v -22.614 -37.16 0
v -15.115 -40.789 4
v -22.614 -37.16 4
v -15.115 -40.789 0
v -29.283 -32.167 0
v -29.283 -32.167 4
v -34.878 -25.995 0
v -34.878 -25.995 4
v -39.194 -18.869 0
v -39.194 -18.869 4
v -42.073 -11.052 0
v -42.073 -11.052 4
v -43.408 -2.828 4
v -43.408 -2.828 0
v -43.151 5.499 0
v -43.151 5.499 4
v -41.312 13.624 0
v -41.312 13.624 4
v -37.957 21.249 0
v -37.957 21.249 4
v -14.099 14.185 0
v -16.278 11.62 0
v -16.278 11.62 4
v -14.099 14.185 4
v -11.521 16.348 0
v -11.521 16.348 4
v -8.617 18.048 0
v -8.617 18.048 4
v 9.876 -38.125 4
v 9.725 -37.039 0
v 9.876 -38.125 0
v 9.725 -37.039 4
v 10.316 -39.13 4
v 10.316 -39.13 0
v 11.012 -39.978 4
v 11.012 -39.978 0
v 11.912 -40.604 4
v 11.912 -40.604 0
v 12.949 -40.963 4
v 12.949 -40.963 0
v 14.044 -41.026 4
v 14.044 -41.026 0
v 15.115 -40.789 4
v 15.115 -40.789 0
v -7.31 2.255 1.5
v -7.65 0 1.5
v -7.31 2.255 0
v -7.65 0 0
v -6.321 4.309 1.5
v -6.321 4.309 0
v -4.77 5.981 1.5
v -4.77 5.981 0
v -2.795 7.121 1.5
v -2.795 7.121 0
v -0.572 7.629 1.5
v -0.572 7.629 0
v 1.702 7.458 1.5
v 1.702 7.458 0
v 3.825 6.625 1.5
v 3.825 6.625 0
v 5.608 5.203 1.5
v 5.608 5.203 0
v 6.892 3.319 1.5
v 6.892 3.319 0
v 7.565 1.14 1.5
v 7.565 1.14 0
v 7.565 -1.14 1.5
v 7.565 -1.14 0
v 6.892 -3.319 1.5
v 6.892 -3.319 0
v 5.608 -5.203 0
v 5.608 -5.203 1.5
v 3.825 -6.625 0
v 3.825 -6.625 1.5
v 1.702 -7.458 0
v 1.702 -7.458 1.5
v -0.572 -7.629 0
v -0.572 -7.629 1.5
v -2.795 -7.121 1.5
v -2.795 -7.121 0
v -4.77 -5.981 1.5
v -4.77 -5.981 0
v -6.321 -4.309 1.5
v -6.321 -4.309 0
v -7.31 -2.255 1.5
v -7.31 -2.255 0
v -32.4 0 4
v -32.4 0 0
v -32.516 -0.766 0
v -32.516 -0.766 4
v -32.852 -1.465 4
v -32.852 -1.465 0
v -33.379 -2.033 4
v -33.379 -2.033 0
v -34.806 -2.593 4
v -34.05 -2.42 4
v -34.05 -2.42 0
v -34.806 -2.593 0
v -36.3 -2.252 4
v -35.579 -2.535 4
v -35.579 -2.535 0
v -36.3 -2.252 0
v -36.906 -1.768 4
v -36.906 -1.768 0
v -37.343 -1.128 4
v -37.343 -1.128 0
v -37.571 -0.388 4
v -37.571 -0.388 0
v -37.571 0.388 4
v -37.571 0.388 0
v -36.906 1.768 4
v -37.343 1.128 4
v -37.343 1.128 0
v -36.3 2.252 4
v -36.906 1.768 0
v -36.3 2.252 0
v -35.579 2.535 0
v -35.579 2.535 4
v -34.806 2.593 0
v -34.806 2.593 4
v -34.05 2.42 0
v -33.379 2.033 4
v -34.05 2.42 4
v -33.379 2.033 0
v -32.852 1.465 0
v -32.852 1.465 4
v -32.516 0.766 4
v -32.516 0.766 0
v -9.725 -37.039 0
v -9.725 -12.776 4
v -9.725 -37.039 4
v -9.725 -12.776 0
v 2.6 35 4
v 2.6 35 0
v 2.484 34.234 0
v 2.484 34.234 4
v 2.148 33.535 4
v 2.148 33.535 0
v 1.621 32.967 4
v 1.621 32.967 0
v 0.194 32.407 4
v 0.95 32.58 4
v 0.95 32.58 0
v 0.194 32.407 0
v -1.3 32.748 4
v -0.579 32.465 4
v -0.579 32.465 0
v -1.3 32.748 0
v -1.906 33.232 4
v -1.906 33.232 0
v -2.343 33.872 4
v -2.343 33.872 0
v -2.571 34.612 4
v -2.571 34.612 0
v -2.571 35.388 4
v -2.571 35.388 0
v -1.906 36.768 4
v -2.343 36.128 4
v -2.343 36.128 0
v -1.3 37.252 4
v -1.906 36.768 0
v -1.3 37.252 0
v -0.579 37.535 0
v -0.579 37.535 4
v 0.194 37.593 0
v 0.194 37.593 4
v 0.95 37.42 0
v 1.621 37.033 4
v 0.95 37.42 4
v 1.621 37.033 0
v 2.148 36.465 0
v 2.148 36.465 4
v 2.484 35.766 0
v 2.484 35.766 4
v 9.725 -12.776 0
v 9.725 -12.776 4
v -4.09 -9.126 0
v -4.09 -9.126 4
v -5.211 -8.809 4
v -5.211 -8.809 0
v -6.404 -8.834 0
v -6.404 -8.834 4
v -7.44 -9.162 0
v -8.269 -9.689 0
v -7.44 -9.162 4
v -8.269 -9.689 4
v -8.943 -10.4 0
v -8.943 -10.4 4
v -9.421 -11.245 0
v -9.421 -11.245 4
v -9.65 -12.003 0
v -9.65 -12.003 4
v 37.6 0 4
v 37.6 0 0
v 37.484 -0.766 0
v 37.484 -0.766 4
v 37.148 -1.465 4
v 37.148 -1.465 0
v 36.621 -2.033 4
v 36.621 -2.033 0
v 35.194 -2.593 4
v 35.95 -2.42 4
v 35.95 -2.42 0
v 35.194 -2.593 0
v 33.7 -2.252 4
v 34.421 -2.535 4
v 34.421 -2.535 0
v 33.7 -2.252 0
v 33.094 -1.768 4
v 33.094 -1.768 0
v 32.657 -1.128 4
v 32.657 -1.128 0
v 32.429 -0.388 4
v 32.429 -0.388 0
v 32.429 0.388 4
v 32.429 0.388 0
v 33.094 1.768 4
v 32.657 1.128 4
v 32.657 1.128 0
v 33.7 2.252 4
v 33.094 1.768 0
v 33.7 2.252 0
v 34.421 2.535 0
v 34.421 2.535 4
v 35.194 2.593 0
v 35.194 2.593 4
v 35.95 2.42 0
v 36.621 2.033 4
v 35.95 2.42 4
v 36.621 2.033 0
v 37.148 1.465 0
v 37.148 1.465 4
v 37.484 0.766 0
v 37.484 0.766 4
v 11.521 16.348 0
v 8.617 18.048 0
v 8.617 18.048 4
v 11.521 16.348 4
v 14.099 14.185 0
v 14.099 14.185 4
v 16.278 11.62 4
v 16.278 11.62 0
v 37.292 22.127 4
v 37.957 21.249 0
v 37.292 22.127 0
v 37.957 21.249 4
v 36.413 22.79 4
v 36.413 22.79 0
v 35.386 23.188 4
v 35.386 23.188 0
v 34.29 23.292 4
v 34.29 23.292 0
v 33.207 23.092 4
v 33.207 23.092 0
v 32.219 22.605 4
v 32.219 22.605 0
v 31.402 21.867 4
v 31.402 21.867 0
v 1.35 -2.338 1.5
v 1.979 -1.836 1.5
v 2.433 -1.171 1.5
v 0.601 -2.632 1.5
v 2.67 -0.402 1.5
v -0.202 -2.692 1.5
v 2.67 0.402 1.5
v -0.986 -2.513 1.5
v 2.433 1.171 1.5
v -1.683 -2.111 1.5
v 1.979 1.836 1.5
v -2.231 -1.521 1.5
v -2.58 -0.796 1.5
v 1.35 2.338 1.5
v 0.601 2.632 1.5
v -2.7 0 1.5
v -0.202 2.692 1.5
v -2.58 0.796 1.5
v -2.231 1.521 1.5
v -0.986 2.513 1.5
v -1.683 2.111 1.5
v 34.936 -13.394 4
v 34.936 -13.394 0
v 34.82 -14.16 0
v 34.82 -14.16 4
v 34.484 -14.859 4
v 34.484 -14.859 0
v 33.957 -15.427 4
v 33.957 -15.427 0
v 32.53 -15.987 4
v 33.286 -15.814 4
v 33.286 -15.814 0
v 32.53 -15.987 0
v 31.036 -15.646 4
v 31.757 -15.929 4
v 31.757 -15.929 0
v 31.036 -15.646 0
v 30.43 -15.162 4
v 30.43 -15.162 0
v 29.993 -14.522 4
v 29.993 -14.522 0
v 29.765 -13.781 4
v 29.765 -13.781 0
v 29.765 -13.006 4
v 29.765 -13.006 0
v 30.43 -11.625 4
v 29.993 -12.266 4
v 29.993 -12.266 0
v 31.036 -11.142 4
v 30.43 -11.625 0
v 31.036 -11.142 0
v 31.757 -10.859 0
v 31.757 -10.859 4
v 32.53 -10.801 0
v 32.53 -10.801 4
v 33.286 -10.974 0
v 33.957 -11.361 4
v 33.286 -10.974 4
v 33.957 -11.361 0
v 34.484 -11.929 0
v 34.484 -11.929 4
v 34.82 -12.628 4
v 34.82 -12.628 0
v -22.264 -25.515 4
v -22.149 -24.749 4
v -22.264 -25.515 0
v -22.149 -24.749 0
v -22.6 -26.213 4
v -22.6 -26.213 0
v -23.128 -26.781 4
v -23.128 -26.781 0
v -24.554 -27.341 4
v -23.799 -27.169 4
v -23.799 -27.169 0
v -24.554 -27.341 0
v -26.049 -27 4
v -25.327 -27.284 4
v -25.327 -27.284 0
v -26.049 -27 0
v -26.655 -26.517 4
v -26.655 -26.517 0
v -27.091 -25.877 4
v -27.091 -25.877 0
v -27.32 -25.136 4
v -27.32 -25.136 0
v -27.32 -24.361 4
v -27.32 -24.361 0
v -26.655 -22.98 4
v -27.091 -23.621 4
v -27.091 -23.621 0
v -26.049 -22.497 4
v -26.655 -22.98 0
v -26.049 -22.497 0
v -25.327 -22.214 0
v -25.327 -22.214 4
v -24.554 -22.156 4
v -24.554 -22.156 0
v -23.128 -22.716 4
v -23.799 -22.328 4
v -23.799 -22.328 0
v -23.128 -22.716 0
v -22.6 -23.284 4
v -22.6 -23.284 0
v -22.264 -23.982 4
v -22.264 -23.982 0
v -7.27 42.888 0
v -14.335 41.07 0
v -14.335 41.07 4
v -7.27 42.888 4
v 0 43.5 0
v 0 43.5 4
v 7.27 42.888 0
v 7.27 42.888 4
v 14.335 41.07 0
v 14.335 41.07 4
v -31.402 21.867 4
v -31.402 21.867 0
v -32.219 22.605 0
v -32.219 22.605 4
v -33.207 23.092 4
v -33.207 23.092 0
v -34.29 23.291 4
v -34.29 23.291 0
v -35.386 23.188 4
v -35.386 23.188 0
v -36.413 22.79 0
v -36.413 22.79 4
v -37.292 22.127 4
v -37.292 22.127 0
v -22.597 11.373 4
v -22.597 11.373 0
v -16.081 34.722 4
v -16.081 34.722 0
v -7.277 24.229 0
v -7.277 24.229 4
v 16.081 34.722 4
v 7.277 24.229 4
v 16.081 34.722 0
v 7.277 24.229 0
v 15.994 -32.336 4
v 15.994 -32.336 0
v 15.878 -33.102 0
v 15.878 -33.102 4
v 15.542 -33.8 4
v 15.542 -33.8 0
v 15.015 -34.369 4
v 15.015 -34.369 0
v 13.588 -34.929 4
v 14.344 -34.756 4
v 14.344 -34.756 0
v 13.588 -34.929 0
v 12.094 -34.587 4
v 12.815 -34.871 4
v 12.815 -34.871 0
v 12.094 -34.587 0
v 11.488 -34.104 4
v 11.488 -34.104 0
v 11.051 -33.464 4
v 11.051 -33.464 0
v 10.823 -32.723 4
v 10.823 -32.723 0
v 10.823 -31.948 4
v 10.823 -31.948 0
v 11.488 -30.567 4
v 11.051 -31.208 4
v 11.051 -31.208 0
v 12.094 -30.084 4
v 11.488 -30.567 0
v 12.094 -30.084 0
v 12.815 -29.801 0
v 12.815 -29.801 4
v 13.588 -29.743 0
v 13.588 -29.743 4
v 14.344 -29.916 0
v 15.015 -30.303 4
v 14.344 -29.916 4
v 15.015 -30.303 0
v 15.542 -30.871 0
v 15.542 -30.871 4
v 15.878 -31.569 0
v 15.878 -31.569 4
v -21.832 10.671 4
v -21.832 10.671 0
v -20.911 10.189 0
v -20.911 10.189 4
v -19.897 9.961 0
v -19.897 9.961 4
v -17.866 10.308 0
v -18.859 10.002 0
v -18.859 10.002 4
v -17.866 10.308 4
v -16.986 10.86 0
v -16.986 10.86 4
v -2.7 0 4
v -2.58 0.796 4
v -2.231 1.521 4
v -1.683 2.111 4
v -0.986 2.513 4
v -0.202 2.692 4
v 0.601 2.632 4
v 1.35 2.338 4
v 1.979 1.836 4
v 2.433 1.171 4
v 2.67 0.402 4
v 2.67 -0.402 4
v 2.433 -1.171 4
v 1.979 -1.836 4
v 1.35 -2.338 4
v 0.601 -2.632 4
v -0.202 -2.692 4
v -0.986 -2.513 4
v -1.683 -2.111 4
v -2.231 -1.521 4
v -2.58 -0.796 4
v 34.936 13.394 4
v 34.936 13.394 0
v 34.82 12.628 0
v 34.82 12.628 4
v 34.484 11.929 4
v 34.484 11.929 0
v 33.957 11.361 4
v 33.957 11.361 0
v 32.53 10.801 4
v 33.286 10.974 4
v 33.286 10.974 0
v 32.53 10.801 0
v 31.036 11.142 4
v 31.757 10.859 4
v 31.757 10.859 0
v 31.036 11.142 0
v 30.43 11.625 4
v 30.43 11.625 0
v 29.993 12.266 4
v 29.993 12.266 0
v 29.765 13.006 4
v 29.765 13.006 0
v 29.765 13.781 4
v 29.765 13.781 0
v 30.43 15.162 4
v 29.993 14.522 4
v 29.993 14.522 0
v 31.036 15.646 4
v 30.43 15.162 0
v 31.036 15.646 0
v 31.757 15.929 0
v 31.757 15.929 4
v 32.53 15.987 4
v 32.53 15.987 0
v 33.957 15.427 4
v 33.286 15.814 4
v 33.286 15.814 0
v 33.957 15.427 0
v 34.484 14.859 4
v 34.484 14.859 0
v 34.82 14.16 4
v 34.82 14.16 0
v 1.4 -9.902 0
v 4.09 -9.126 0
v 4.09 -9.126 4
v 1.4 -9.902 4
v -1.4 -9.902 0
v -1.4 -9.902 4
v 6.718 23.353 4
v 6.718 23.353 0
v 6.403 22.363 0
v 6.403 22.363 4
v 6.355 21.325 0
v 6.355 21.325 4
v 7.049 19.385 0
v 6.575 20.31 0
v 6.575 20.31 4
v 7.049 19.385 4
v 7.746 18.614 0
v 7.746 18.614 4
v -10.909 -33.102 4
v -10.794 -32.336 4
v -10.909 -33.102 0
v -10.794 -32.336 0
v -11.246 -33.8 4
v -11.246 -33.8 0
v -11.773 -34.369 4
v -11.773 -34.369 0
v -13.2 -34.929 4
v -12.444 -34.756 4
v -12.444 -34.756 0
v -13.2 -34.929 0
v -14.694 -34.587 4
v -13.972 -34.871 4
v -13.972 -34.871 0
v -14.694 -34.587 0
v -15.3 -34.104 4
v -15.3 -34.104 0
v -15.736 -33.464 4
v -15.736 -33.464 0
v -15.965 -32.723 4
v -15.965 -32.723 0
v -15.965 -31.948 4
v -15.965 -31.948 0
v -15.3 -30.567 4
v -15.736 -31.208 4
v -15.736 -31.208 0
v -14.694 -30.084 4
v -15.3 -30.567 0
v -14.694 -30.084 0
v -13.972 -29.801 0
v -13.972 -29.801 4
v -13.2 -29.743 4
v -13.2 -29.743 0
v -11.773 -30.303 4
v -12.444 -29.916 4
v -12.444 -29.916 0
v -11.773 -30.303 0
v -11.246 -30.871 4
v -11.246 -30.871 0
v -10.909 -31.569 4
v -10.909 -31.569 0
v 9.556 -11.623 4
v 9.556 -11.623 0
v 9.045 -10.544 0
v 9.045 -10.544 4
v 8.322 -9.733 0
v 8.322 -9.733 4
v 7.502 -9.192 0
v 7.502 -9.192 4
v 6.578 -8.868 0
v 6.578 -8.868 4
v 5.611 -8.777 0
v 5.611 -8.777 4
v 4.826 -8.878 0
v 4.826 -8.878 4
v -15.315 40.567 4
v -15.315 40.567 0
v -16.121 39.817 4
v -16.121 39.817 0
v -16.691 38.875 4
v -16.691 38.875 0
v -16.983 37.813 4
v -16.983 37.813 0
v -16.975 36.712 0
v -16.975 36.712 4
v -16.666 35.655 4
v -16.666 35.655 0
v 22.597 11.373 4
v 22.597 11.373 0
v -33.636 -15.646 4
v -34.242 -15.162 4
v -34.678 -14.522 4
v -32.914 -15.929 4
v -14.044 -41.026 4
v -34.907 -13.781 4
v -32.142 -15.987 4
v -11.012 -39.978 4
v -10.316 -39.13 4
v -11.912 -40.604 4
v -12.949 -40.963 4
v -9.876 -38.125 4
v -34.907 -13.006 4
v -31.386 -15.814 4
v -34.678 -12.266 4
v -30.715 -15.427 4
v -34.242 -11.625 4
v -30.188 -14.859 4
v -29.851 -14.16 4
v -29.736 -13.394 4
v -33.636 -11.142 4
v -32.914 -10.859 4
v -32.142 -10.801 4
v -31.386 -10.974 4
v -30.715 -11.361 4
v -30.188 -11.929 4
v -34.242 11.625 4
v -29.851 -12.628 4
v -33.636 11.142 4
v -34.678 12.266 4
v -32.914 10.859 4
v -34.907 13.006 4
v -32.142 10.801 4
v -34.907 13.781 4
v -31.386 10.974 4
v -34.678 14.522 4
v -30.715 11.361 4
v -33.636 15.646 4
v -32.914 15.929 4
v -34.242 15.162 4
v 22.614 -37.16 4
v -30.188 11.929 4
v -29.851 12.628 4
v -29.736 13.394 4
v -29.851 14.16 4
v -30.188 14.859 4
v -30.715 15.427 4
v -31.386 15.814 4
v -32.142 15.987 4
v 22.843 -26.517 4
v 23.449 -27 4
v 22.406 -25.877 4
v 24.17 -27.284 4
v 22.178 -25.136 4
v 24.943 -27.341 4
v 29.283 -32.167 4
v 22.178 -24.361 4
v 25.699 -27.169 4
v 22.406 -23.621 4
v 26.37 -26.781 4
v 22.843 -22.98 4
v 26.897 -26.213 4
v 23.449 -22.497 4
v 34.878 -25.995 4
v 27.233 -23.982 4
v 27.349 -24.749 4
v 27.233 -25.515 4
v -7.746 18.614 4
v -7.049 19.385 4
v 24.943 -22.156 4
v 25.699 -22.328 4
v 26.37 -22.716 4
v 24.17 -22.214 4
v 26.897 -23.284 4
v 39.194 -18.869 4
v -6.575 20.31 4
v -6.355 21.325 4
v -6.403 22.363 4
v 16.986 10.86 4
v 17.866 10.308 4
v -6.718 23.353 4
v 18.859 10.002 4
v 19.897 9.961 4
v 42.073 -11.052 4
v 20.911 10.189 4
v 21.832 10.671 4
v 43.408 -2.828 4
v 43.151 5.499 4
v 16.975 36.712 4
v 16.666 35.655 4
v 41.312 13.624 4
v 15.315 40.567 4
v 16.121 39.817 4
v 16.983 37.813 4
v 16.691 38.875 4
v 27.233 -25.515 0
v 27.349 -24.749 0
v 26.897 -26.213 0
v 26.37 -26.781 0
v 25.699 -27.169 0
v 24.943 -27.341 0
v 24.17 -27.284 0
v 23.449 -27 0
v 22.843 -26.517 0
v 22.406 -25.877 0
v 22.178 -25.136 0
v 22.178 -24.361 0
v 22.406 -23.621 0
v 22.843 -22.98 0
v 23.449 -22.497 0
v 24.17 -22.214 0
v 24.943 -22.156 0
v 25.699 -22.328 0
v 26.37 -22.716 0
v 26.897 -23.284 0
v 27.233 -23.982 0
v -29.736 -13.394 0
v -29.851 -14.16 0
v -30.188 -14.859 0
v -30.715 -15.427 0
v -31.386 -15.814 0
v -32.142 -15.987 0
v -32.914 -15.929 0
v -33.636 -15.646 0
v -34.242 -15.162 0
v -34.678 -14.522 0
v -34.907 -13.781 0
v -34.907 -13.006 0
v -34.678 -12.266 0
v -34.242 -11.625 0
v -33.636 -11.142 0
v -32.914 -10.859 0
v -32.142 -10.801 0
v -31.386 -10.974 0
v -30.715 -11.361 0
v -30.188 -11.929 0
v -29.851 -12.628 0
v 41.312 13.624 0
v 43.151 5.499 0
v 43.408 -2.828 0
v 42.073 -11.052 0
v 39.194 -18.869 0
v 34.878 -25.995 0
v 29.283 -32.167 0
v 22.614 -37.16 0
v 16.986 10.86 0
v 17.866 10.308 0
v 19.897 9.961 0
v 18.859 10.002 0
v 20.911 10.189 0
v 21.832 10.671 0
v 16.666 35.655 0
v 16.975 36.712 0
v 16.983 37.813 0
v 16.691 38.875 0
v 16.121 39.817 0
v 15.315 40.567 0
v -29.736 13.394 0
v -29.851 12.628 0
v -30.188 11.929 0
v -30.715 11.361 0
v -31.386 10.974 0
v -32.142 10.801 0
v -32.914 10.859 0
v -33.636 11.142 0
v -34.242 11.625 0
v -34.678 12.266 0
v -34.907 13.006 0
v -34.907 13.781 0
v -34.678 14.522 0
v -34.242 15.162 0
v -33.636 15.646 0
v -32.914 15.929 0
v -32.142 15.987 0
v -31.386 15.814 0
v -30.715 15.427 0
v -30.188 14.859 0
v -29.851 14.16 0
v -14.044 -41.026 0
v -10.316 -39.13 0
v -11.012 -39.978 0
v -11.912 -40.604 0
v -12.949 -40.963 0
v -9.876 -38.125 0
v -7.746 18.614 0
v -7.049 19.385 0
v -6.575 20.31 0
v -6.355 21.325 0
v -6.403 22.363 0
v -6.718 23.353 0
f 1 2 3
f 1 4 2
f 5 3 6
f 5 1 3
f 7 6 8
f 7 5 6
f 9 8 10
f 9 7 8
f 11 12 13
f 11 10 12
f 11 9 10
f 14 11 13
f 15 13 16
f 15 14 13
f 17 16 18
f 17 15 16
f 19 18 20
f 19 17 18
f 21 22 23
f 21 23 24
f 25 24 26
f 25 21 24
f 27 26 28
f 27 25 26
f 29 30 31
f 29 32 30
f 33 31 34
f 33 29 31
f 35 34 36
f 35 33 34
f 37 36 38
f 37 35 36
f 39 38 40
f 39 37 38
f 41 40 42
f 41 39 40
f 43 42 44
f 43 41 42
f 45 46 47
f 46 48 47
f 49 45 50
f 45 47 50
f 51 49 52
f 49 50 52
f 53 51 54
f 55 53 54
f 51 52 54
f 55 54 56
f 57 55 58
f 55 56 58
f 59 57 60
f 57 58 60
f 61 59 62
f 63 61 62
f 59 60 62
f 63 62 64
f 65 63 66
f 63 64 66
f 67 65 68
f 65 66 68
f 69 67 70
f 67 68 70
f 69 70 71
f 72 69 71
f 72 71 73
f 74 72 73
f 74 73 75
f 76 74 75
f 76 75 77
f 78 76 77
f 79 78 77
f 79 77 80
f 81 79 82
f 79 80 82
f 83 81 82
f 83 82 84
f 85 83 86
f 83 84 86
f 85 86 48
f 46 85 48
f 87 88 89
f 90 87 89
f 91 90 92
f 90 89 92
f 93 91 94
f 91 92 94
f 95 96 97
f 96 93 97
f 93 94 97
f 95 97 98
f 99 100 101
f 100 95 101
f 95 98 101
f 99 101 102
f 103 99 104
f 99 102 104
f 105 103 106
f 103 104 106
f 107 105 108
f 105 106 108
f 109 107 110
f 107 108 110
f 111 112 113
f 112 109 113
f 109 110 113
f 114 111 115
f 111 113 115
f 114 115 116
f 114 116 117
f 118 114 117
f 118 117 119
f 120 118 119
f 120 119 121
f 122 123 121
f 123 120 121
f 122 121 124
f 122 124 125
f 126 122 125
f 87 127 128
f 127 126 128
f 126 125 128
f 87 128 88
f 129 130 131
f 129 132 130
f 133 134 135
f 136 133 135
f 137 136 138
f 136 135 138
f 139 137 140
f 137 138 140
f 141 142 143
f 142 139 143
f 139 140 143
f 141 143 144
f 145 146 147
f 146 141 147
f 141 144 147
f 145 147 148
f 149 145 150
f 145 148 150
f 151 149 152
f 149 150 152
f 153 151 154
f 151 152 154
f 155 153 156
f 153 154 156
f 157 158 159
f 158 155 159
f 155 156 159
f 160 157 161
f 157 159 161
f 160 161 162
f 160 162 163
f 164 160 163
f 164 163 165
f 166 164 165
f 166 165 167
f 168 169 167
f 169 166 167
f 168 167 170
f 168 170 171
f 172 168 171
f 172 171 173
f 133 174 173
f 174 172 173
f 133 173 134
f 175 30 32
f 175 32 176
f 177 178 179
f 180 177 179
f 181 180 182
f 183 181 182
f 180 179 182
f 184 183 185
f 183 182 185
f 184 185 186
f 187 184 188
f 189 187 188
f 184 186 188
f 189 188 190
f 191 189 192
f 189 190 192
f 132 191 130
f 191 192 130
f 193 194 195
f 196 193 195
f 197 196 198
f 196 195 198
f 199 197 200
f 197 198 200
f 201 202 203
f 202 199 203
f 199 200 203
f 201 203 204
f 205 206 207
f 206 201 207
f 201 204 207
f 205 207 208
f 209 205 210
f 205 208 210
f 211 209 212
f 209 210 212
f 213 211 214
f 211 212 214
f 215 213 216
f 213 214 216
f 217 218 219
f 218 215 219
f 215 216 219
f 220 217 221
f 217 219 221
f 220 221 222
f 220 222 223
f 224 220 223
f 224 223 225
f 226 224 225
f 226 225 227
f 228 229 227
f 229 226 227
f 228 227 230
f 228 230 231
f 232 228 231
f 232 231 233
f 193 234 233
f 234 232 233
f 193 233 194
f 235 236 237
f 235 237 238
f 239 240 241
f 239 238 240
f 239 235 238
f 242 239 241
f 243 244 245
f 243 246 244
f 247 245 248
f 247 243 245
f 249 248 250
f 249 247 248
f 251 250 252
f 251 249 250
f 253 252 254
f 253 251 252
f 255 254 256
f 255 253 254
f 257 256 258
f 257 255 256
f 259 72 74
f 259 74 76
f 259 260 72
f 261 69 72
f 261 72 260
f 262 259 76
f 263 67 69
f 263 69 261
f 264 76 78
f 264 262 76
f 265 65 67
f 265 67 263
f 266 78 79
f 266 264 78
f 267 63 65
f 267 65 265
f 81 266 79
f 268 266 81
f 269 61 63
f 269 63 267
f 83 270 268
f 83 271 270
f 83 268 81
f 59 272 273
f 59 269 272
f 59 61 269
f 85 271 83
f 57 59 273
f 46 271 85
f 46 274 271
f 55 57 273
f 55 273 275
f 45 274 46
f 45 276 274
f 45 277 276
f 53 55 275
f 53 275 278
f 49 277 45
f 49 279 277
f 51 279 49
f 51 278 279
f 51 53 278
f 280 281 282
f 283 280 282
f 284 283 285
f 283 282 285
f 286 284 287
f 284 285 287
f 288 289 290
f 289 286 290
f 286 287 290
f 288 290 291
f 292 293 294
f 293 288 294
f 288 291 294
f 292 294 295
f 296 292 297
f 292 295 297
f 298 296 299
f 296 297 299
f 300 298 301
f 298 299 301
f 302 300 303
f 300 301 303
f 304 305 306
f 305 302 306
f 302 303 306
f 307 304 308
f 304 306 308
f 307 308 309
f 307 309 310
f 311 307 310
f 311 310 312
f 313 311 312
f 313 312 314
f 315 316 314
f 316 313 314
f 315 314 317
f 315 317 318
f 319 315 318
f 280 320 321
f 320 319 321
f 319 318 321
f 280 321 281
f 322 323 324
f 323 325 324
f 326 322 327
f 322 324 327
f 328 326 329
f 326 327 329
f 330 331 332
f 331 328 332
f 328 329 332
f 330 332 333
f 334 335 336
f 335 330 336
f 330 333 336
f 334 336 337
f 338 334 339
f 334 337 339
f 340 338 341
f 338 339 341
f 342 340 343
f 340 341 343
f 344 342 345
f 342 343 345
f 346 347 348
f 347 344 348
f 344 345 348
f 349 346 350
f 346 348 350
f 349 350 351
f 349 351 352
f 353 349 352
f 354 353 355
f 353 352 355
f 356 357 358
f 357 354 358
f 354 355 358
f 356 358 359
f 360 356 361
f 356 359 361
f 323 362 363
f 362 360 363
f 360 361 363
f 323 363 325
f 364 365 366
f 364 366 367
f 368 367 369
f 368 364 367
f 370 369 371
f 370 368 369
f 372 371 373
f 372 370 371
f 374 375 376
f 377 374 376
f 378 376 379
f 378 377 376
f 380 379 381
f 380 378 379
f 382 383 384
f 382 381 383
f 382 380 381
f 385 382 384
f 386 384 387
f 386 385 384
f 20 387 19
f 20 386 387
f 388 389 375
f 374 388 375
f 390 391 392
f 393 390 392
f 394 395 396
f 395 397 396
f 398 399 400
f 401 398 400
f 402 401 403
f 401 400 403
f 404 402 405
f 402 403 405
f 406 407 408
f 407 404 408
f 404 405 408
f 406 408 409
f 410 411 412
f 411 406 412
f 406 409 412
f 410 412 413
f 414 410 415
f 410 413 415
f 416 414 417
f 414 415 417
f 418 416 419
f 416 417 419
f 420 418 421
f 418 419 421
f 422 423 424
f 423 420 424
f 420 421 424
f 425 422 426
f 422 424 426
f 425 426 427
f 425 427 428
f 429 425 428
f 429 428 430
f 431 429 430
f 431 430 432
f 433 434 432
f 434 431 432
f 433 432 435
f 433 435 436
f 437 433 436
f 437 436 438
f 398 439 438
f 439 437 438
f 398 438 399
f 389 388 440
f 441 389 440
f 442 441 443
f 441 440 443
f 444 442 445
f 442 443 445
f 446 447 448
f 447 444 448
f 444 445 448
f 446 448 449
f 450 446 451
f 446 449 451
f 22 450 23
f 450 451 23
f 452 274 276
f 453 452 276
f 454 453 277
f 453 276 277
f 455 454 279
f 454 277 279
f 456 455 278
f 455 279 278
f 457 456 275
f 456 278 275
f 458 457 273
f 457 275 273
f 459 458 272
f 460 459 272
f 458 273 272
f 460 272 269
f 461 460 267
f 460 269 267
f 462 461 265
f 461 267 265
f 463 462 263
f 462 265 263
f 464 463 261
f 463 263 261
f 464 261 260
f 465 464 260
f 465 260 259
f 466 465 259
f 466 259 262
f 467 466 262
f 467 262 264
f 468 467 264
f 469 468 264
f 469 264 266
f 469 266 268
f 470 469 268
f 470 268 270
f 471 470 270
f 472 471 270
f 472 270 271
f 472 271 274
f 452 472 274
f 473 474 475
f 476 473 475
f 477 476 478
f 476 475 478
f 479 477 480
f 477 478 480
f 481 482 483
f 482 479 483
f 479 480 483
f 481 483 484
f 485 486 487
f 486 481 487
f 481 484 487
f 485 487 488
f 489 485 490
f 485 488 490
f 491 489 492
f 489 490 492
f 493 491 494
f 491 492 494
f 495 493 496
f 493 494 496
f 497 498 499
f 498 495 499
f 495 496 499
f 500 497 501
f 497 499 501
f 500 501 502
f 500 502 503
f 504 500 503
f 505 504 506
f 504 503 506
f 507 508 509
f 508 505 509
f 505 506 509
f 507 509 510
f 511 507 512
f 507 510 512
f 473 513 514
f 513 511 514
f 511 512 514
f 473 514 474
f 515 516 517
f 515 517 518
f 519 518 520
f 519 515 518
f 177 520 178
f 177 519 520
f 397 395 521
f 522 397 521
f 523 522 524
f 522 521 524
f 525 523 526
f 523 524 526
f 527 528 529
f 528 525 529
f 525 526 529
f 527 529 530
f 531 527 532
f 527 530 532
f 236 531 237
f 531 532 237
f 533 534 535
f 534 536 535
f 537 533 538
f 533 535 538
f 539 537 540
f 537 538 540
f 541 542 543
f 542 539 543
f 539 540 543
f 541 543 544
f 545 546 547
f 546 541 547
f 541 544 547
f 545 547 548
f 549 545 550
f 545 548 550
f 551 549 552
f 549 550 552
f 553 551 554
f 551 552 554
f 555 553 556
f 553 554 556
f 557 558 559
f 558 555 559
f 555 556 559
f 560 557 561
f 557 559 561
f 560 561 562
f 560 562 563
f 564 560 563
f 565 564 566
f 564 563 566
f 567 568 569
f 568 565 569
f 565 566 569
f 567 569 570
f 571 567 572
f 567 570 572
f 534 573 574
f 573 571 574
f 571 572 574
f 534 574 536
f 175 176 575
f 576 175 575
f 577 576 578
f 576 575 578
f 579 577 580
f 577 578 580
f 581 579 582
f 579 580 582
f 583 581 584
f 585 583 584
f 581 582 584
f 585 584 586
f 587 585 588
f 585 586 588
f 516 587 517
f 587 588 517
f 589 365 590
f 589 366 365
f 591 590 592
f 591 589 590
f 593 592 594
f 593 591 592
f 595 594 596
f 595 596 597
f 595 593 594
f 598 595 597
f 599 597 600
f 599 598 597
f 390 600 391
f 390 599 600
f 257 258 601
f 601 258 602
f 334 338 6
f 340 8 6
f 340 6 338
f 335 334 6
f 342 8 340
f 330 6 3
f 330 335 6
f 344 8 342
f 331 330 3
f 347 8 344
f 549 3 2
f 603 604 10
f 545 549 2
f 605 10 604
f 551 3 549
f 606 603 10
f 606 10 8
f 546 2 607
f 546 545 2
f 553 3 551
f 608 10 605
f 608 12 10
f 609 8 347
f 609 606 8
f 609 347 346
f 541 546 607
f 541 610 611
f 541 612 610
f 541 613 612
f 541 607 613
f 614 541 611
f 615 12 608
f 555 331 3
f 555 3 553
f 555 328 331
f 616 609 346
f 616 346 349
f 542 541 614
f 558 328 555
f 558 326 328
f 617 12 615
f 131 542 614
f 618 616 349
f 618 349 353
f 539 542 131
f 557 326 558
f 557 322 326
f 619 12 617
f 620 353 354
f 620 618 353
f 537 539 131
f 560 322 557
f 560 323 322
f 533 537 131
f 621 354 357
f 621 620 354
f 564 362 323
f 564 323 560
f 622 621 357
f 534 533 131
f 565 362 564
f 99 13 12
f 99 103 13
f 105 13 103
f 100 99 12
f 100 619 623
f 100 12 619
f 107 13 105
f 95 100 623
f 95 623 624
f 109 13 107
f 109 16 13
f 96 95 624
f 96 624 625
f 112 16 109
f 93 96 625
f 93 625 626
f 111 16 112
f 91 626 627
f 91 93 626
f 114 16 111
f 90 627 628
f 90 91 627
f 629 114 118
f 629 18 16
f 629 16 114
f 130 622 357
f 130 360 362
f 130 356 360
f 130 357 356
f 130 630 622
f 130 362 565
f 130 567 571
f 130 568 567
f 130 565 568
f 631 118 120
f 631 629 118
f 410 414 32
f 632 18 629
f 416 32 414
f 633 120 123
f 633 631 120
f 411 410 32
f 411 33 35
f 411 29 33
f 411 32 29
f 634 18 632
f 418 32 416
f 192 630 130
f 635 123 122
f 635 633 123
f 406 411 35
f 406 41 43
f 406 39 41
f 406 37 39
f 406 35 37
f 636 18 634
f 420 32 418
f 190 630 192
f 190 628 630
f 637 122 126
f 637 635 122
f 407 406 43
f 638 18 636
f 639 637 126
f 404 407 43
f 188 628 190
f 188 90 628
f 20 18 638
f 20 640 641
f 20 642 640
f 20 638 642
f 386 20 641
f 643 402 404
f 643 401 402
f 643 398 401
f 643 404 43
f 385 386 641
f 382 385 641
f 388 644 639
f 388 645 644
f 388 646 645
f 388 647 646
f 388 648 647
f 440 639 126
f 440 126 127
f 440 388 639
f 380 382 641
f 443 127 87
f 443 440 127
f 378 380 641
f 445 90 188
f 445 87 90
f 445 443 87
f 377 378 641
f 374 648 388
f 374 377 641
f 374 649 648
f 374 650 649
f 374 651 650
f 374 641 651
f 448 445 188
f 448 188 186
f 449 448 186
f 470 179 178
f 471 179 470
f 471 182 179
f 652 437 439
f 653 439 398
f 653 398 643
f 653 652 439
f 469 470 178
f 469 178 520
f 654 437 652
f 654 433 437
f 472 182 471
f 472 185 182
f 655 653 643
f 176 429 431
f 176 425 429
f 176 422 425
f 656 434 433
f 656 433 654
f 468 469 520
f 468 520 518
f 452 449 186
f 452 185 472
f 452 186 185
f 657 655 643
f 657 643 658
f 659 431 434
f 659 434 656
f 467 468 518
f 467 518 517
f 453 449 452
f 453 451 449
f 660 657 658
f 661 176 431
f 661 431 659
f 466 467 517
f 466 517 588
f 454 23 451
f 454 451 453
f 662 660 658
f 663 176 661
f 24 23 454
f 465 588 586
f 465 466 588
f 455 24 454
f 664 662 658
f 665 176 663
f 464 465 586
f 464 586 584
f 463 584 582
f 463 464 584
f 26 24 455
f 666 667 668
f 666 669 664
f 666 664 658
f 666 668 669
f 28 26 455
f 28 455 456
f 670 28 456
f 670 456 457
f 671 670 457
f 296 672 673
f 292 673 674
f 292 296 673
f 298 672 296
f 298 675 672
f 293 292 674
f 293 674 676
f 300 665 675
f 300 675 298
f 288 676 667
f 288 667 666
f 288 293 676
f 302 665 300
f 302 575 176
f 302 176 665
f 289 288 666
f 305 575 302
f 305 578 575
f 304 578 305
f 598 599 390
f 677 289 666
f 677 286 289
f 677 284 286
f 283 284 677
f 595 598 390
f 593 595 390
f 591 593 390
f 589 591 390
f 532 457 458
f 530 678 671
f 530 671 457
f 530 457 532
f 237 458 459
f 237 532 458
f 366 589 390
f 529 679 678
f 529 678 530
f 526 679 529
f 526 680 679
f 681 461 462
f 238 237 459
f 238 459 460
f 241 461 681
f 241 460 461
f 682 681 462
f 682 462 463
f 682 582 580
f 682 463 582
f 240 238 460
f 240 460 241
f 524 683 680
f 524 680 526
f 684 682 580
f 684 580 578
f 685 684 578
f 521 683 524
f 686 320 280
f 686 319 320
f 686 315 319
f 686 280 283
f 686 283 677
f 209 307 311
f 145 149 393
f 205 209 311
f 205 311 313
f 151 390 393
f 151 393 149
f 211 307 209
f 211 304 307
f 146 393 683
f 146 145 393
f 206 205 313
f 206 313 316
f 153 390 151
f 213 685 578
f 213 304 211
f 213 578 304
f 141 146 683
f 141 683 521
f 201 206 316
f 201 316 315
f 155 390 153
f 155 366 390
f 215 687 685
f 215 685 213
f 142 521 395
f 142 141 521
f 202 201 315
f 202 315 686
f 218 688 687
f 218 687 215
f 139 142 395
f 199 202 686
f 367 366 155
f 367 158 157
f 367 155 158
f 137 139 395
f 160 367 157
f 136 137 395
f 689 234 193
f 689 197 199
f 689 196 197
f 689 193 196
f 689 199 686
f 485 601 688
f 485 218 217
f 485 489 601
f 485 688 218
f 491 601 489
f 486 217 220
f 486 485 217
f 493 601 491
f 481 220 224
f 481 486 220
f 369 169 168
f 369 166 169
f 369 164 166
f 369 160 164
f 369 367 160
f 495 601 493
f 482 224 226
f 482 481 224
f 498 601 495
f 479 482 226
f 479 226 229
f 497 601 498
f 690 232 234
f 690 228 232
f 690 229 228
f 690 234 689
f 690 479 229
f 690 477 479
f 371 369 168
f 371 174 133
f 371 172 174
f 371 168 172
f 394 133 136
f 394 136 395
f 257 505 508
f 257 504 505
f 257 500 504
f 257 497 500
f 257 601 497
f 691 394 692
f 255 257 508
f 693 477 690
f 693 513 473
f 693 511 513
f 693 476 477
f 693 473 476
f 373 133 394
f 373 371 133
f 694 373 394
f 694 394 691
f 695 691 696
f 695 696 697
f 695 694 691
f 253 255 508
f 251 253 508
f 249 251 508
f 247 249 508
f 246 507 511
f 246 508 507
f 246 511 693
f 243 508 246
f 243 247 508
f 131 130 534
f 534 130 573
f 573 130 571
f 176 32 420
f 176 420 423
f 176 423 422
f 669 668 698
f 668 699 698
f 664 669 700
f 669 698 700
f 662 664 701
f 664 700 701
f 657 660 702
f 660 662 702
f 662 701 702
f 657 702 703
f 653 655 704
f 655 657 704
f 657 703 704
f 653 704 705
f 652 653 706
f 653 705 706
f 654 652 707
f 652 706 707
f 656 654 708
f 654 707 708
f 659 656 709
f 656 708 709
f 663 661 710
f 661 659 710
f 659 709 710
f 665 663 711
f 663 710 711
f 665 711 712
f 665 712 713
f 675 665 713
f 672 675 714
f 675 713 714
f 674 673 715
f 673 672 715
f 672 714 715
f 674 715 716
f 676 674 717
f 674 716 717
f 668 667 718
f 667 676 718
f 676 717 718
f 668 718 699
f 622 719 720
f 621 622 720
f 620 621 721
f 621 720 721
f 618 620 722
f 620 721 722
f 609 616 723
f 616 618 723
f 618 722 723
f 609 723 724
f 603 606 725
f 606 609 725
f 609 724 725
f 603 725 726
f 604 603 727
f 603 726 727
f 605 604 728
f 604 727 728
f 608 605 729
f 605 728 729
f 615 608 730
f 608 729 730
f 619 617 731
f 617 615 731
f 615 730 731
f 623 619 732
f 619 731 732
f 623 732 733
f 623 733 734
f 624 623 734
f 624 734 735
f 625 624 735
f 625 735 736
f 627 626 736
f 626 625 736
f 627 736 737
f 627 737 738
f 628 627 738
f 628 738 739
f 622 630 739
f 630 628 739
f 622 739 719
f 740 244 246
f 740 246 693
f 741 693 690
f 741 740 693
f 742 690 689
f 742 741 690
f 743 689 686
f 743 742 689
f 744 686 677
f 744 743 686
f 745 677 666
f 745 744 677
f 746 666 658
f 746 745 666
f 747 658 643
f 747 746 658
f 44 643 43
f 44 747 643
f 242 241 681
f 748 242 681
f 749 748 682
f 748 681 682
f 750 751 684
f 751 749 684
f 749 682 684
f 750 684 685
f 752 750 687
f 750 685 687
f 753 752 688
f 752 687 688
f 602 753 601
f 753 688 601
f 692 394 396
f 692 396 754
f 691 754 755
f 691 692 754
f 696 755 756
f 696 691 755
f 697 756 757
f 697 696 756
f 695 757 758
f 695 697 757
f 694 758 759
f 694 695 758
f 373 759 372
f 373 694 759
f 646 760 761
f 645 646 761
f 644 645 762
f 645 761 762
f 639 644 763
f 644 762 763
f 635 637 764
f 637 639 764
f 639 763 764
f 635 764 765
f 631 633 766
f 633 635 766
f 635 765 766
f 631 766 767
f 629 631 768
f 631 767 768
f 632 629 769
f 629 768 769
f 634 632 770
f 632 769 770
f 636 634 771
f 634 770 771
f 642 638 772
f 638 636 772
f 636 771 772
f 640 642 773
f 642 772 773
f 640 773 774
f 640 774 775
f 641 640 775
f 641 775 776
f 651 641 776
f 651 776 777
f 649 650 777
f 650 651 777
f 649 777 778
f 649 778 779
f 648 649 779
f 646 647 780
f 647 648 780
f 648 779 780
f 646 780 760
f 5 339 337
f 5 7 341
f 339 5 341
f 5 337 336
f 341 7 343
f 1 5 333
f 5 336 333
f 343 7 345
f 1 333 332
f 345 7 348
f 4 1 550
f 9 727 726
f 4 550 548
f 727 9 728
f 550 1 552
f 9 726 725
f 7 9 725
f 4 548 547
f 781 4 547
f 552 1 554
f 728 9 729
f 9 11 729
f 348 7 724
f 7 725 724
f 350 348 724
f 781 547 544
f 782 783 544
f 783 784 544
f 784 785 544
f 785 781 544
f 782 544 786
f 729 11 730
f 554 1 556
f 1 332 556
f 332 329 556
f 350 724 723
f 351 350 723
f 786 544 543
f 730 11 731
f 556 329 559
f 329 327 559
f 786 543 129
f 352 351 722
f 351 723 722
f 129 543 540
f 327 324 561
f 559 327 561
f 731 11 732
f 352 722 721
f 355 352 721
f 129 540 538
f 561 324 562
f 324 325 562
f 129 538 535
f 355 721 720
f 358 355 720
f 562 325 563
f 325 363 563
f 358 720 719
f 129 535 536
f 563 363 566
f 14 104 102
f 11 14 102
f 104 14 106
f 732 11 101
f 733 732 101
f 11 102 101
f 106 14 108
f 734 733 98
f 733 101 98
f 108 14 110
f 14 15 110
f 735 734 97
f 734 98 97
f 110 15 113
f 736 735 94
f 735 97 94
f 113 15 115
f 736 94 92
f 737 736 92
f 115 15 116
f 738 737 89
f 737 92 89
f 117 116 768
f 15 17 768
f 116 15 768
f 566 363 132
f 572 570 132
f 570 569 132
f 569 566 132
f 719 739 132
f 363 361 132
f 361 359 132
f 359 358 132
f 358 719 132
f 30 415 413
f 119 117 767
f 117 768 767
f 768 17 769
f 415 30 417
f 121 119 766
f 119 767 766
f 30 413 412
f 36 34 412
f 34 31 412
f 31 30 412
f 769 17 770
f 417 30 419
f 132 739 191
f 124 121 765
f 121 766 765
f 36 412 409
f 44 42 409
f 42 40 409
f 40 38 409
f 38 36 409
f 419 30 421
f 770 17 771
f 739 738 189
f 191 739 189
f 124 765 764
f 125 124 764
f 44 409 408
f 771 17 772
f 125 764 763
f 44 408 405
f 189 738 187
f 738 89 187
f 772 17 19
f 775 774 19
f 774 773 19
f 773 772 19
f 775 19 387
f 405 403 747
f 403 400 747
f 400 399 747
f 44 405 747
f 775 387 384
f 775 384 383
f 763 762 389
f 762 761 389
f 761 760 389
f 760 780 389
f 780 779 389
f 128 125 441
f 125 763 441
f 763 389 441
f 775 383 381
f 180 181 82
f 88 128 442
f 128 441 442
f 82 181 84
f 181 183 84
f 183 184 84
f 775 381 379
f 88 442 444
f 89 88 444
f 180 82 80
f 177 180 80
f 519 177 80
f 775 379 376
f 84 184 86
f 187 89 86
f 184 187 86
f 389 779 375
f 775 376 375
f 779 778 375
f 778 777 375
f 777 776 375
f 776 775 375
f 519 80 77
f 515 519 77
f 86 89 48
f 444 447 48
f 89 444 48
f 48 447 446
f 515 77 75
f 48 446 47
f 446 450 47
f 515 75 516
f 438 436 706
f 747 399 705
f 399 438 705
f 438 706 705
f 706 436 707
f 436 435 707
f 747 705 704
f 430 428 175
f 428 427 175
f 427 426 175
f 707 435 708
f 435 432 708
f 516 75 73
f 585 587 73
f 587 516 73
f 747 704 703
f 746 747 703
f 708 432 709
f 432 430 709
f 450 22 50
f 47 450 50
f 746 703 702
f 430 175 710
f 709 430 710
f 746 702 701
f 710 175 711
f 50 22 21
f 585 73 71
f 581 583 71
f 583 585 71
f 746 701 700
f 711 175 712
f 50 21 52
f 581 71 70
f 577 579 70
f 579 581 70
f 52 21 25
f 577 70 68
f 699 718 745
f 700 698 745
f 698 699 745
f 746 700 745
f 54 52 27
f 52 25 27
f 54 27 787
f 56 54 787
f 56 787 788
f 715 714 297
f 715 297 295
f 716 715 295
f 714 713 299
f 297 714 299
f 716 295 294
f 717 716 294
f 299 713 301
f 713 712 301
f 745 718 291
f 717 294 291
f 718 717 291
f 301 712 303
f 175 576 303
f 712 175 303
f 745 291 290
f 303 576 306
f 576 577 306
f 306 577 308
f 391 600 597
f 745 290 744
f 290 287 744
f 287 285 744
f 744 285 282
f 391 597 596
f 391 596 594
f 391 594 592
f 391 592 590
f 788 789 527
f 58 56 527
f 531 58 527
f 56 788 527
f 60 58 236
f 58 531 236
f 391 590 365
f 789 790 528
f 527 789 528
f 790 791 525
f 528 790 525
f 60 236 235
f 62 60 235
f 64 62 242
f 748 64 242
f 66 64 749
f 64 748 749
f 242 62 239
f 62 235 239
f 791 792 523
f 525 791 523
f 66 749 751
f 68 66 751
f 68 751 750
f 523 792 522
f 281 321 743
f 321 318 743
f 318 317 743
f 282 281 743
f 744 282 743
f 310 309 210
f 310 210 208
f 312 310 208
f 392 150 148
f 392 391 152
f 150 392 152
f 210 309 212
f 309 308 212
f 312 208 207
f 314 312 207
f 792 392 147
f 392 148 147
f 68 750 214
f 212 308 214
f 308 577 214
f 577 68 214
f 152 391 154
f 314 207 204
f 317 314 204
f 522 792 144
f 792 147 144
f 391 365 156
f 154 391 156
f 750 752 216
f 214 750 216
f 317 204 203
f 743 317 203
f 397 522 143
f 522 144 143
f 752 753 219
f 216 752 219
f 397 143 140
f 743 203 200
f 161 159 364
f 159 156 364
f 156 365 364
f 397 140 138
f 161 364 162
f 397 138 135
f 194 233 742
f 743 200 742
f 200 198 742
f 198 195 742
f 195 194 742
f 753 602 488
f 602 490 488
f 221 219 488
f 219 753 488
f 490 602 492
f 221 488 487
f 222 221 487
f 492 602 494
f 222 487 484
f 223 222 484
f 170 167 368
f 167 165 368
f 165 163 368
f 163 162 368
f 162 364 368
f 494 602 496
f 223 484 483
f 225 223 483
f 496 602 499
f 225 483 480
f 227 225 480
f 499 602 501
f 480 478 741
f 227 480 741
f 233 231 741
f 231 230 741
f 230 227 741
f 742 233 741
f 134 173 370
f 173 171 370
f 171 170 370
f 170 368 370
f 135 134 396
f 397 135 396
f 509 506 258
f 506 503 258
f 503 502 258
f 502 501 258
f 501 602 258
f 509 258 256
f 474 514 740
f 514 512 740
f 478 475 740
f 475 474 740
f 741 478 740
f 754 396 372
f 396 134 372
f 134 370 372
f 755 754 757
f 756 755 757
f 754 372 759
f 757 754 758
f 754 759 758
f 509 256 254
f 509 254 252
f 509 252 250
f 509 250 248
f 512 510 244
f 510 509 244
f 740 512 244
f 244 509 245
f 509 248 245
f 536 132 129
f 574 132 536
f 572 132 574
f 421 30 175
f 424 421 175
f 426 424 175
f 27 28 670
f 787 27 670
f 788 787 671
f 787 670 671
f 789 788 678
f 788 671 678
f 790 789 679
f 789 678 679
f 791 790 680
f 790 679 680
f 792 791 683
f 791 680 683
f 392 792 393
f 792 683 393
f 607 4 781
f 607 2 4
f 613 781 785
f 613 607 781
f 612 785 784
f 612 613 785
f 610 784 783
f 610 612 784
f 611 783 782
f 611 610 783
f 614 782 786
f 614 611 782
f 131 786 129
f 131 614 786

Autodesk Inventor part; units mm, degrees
ref_plane "YZ Plane" through (0, 0, 0) normal (1, 0, 0) x (0, 1, 0)
ref_plane "XZ Plane" through (0, 0, 0) normal (0, 1, 0) x (-1, 0, 0)
ref_plane "XY Plane" through (0, 0, 0) normal (0, 0, 1) x (1, 0, 0)
sketch "Sketch1" plane through (0, 0, 0) normal (0, 0, 1) x (1, 0, 0)
  circle A0 centre (0, 0) radius 43.5
  circle A1 centre (0, 35) radius 2.6
  circle A2 centre (-13.3939, 32.3358) radius 2.6
  circle A3 centre (-24.7487, 24.7487) radius 2.6
  circle A4 centre (-32.3358, 13.3939) radius 2.6
  circle A5 centre (-35, 0) radius 2.6
  circle A6 centre (-32.3358, -13.3939) radius 2.6
  circle A7 centre (-24.7487, -24.7487) radius 2.6
  circle A8 centre (-13.3939, -32.3358) radius 2.6
  circle A9 centre (0, -35) radius 2.6
  circle A10 centre (13.3939, -32.3358) radius 2.6
  circle A11 centre (24.7487, -24.7487) radius 2.6
  circle A12 centre (32.3358, -13.3939) radius 2.6
  circle A13 centre (35, 0) radius 2.6
  circle A14 centre (32.3358, 13.3939) radius 2.6
  circle A15 centre (24.7487, 24.7487) radius 2.6
  circle A16 centre (13.3939, 32.3358) radius 2.6
  line L0 (0, 0) -> (0, -92.2535) construction
  line L1 (-9.7254, 0) -> (-9.7254, -92.2535)
  line L2 (9.7254, -92.2535) -> (9.7254, 0)
  arc A17 (9.7254, 0) -> (-9.7254, 0) centre (0, 0) ccw
  arc A18 (-9.7254, -92.2535) -> (9.7254, -92.2535) centre (0, -92.2535) ccw
  line L3 (0, 0) -> (-60.6432, 72.2718) construction
  line L4 (-7.6604, -6.4279) -> (-68.3037, 65.8439)
  line L5 (-52.9828, 78.6997) -> (7.6604, 6.4279)
  arc A19 (-7.6604, -6.4279) -> (7.6604, 6.4279) centre (0, 0) ccw
  arc A20 (-52.9828, 78.6997) -> (-68.3037, 65.8439) centre (-60.6432, 72.2718) ccw
  line L6 (0, 0) -> (65.9097, 78.5481) construction
  line L7 (-7.6604, 6.4279) -> (58.2493, 84.976)
  line L8 (73.5702, 72.1203) -> (7.6604, -6.4279)
  arc A21 (-7.6604, 6.4279) -> (7.6604, -6.4279) centre (0, 0) ccw
  arc A22 (73.5702, 72.1203) -> (58.2493, 84.976) centre (65.9097, 78.5481) ccw
  circle A23 centre (0, 0) radius 20
  point P0 (0, -46.1267)
  point P1 (-30.3216, 36.1359)
  point P2 (32.9549, 39.2741)
  point P3 (18.7939, 6.8404)
  point P4 (3.473, 19.6962)
  point P5 (19.552, 38.8583)
  point P6 (-19.552, 38.8583)
  point P7 (-3.473, 19.6962)
  point P8 (-18.7939, 6.8404)
  point P9 (-34.8728, 26.0026)
  point P10 (-9.7254, -42.3989)
  point P11 (-9.7254, -17.4762)
  point P12 (9.7254, -17.4762)
  point P13 (9.7254, -42.3989)
  point P14 (34.8728, 26.0026)
  point P15 (7.6604, -6.4279)
  point P16 (9.7254, -3.9669)
  point P17 (-9.7254, -3.9669)
  dimension "d0" = 87
  dimension "d1" = 5.2
  dimension "d2" = 35
  dimension "d5" = 360
  dimension "d7" = 140
  dimension "d8" = 140
  dimension "d9" = 10
  dimension "d10" = 10
  dimension "d11" = 40
extrude "Extrusion1" add sketch "Sketch1" along normal blind 4 contours A0 L2 A23 L8 | L7 A16 A23 L5 A2 A0 | A23 L2 L8 | L8 L2 A19 L5 L7 A23 | A0 L4 A23 L1 | L7 A16 | L8 A19 L2 | L7 L5 A23 | A23 L4 L1 | A2 L5 | A19 A21 L1 A17 L2 | L2 A17 L1 A21 L7 L5 A19 | L7 A21 L1 L4 A23 L5 | L1 A21 L4 picked at (13.6821, 33.106) picked at (-12.7209, 31.8549)
sketch "Sketch2" plane through (0, 0, 0) normal (0, 0, -1) x (-1, 0, 0)
  circle A0 centre (0, 0) radius 7.65
  dimension "d14" = 15.3
extrude "Extrusion2" cut sketch "Sketch2" against normal blind 1.5
sketch "Sketch3" plane through (0, 0, 1.5) normal (0, 0, -1) x (-1, 0, 0)
  circle A0 centre (0, 0) radius 2.7
  dimension "d17" = 5.4
extrude "Extrusion3" cut sketch "Sketch3" against normal up to surface (2.5 mm away)
fillet "Fillet1" radius 4 12 edges at (9.7254, -3.9669, 2) (-9.7254, -3.9669, 2) (3.473, 19.6962, 2) (18.7939, 6.8404, 2) (-18.7939, 6.8404, 2) (-3.473, 19.6962, 2) (34.8728, 26.0026, 2) (19.552, 38.8583, 2) (-19.552, 38.8583, 2) (-34.8728, 26.0026, 2) (-9.7254, -42.3989, 2) (9.7254, -42.3989, 2)
equation "\"d10\" = d9"
properties part number "LED disk_3DPrint"
